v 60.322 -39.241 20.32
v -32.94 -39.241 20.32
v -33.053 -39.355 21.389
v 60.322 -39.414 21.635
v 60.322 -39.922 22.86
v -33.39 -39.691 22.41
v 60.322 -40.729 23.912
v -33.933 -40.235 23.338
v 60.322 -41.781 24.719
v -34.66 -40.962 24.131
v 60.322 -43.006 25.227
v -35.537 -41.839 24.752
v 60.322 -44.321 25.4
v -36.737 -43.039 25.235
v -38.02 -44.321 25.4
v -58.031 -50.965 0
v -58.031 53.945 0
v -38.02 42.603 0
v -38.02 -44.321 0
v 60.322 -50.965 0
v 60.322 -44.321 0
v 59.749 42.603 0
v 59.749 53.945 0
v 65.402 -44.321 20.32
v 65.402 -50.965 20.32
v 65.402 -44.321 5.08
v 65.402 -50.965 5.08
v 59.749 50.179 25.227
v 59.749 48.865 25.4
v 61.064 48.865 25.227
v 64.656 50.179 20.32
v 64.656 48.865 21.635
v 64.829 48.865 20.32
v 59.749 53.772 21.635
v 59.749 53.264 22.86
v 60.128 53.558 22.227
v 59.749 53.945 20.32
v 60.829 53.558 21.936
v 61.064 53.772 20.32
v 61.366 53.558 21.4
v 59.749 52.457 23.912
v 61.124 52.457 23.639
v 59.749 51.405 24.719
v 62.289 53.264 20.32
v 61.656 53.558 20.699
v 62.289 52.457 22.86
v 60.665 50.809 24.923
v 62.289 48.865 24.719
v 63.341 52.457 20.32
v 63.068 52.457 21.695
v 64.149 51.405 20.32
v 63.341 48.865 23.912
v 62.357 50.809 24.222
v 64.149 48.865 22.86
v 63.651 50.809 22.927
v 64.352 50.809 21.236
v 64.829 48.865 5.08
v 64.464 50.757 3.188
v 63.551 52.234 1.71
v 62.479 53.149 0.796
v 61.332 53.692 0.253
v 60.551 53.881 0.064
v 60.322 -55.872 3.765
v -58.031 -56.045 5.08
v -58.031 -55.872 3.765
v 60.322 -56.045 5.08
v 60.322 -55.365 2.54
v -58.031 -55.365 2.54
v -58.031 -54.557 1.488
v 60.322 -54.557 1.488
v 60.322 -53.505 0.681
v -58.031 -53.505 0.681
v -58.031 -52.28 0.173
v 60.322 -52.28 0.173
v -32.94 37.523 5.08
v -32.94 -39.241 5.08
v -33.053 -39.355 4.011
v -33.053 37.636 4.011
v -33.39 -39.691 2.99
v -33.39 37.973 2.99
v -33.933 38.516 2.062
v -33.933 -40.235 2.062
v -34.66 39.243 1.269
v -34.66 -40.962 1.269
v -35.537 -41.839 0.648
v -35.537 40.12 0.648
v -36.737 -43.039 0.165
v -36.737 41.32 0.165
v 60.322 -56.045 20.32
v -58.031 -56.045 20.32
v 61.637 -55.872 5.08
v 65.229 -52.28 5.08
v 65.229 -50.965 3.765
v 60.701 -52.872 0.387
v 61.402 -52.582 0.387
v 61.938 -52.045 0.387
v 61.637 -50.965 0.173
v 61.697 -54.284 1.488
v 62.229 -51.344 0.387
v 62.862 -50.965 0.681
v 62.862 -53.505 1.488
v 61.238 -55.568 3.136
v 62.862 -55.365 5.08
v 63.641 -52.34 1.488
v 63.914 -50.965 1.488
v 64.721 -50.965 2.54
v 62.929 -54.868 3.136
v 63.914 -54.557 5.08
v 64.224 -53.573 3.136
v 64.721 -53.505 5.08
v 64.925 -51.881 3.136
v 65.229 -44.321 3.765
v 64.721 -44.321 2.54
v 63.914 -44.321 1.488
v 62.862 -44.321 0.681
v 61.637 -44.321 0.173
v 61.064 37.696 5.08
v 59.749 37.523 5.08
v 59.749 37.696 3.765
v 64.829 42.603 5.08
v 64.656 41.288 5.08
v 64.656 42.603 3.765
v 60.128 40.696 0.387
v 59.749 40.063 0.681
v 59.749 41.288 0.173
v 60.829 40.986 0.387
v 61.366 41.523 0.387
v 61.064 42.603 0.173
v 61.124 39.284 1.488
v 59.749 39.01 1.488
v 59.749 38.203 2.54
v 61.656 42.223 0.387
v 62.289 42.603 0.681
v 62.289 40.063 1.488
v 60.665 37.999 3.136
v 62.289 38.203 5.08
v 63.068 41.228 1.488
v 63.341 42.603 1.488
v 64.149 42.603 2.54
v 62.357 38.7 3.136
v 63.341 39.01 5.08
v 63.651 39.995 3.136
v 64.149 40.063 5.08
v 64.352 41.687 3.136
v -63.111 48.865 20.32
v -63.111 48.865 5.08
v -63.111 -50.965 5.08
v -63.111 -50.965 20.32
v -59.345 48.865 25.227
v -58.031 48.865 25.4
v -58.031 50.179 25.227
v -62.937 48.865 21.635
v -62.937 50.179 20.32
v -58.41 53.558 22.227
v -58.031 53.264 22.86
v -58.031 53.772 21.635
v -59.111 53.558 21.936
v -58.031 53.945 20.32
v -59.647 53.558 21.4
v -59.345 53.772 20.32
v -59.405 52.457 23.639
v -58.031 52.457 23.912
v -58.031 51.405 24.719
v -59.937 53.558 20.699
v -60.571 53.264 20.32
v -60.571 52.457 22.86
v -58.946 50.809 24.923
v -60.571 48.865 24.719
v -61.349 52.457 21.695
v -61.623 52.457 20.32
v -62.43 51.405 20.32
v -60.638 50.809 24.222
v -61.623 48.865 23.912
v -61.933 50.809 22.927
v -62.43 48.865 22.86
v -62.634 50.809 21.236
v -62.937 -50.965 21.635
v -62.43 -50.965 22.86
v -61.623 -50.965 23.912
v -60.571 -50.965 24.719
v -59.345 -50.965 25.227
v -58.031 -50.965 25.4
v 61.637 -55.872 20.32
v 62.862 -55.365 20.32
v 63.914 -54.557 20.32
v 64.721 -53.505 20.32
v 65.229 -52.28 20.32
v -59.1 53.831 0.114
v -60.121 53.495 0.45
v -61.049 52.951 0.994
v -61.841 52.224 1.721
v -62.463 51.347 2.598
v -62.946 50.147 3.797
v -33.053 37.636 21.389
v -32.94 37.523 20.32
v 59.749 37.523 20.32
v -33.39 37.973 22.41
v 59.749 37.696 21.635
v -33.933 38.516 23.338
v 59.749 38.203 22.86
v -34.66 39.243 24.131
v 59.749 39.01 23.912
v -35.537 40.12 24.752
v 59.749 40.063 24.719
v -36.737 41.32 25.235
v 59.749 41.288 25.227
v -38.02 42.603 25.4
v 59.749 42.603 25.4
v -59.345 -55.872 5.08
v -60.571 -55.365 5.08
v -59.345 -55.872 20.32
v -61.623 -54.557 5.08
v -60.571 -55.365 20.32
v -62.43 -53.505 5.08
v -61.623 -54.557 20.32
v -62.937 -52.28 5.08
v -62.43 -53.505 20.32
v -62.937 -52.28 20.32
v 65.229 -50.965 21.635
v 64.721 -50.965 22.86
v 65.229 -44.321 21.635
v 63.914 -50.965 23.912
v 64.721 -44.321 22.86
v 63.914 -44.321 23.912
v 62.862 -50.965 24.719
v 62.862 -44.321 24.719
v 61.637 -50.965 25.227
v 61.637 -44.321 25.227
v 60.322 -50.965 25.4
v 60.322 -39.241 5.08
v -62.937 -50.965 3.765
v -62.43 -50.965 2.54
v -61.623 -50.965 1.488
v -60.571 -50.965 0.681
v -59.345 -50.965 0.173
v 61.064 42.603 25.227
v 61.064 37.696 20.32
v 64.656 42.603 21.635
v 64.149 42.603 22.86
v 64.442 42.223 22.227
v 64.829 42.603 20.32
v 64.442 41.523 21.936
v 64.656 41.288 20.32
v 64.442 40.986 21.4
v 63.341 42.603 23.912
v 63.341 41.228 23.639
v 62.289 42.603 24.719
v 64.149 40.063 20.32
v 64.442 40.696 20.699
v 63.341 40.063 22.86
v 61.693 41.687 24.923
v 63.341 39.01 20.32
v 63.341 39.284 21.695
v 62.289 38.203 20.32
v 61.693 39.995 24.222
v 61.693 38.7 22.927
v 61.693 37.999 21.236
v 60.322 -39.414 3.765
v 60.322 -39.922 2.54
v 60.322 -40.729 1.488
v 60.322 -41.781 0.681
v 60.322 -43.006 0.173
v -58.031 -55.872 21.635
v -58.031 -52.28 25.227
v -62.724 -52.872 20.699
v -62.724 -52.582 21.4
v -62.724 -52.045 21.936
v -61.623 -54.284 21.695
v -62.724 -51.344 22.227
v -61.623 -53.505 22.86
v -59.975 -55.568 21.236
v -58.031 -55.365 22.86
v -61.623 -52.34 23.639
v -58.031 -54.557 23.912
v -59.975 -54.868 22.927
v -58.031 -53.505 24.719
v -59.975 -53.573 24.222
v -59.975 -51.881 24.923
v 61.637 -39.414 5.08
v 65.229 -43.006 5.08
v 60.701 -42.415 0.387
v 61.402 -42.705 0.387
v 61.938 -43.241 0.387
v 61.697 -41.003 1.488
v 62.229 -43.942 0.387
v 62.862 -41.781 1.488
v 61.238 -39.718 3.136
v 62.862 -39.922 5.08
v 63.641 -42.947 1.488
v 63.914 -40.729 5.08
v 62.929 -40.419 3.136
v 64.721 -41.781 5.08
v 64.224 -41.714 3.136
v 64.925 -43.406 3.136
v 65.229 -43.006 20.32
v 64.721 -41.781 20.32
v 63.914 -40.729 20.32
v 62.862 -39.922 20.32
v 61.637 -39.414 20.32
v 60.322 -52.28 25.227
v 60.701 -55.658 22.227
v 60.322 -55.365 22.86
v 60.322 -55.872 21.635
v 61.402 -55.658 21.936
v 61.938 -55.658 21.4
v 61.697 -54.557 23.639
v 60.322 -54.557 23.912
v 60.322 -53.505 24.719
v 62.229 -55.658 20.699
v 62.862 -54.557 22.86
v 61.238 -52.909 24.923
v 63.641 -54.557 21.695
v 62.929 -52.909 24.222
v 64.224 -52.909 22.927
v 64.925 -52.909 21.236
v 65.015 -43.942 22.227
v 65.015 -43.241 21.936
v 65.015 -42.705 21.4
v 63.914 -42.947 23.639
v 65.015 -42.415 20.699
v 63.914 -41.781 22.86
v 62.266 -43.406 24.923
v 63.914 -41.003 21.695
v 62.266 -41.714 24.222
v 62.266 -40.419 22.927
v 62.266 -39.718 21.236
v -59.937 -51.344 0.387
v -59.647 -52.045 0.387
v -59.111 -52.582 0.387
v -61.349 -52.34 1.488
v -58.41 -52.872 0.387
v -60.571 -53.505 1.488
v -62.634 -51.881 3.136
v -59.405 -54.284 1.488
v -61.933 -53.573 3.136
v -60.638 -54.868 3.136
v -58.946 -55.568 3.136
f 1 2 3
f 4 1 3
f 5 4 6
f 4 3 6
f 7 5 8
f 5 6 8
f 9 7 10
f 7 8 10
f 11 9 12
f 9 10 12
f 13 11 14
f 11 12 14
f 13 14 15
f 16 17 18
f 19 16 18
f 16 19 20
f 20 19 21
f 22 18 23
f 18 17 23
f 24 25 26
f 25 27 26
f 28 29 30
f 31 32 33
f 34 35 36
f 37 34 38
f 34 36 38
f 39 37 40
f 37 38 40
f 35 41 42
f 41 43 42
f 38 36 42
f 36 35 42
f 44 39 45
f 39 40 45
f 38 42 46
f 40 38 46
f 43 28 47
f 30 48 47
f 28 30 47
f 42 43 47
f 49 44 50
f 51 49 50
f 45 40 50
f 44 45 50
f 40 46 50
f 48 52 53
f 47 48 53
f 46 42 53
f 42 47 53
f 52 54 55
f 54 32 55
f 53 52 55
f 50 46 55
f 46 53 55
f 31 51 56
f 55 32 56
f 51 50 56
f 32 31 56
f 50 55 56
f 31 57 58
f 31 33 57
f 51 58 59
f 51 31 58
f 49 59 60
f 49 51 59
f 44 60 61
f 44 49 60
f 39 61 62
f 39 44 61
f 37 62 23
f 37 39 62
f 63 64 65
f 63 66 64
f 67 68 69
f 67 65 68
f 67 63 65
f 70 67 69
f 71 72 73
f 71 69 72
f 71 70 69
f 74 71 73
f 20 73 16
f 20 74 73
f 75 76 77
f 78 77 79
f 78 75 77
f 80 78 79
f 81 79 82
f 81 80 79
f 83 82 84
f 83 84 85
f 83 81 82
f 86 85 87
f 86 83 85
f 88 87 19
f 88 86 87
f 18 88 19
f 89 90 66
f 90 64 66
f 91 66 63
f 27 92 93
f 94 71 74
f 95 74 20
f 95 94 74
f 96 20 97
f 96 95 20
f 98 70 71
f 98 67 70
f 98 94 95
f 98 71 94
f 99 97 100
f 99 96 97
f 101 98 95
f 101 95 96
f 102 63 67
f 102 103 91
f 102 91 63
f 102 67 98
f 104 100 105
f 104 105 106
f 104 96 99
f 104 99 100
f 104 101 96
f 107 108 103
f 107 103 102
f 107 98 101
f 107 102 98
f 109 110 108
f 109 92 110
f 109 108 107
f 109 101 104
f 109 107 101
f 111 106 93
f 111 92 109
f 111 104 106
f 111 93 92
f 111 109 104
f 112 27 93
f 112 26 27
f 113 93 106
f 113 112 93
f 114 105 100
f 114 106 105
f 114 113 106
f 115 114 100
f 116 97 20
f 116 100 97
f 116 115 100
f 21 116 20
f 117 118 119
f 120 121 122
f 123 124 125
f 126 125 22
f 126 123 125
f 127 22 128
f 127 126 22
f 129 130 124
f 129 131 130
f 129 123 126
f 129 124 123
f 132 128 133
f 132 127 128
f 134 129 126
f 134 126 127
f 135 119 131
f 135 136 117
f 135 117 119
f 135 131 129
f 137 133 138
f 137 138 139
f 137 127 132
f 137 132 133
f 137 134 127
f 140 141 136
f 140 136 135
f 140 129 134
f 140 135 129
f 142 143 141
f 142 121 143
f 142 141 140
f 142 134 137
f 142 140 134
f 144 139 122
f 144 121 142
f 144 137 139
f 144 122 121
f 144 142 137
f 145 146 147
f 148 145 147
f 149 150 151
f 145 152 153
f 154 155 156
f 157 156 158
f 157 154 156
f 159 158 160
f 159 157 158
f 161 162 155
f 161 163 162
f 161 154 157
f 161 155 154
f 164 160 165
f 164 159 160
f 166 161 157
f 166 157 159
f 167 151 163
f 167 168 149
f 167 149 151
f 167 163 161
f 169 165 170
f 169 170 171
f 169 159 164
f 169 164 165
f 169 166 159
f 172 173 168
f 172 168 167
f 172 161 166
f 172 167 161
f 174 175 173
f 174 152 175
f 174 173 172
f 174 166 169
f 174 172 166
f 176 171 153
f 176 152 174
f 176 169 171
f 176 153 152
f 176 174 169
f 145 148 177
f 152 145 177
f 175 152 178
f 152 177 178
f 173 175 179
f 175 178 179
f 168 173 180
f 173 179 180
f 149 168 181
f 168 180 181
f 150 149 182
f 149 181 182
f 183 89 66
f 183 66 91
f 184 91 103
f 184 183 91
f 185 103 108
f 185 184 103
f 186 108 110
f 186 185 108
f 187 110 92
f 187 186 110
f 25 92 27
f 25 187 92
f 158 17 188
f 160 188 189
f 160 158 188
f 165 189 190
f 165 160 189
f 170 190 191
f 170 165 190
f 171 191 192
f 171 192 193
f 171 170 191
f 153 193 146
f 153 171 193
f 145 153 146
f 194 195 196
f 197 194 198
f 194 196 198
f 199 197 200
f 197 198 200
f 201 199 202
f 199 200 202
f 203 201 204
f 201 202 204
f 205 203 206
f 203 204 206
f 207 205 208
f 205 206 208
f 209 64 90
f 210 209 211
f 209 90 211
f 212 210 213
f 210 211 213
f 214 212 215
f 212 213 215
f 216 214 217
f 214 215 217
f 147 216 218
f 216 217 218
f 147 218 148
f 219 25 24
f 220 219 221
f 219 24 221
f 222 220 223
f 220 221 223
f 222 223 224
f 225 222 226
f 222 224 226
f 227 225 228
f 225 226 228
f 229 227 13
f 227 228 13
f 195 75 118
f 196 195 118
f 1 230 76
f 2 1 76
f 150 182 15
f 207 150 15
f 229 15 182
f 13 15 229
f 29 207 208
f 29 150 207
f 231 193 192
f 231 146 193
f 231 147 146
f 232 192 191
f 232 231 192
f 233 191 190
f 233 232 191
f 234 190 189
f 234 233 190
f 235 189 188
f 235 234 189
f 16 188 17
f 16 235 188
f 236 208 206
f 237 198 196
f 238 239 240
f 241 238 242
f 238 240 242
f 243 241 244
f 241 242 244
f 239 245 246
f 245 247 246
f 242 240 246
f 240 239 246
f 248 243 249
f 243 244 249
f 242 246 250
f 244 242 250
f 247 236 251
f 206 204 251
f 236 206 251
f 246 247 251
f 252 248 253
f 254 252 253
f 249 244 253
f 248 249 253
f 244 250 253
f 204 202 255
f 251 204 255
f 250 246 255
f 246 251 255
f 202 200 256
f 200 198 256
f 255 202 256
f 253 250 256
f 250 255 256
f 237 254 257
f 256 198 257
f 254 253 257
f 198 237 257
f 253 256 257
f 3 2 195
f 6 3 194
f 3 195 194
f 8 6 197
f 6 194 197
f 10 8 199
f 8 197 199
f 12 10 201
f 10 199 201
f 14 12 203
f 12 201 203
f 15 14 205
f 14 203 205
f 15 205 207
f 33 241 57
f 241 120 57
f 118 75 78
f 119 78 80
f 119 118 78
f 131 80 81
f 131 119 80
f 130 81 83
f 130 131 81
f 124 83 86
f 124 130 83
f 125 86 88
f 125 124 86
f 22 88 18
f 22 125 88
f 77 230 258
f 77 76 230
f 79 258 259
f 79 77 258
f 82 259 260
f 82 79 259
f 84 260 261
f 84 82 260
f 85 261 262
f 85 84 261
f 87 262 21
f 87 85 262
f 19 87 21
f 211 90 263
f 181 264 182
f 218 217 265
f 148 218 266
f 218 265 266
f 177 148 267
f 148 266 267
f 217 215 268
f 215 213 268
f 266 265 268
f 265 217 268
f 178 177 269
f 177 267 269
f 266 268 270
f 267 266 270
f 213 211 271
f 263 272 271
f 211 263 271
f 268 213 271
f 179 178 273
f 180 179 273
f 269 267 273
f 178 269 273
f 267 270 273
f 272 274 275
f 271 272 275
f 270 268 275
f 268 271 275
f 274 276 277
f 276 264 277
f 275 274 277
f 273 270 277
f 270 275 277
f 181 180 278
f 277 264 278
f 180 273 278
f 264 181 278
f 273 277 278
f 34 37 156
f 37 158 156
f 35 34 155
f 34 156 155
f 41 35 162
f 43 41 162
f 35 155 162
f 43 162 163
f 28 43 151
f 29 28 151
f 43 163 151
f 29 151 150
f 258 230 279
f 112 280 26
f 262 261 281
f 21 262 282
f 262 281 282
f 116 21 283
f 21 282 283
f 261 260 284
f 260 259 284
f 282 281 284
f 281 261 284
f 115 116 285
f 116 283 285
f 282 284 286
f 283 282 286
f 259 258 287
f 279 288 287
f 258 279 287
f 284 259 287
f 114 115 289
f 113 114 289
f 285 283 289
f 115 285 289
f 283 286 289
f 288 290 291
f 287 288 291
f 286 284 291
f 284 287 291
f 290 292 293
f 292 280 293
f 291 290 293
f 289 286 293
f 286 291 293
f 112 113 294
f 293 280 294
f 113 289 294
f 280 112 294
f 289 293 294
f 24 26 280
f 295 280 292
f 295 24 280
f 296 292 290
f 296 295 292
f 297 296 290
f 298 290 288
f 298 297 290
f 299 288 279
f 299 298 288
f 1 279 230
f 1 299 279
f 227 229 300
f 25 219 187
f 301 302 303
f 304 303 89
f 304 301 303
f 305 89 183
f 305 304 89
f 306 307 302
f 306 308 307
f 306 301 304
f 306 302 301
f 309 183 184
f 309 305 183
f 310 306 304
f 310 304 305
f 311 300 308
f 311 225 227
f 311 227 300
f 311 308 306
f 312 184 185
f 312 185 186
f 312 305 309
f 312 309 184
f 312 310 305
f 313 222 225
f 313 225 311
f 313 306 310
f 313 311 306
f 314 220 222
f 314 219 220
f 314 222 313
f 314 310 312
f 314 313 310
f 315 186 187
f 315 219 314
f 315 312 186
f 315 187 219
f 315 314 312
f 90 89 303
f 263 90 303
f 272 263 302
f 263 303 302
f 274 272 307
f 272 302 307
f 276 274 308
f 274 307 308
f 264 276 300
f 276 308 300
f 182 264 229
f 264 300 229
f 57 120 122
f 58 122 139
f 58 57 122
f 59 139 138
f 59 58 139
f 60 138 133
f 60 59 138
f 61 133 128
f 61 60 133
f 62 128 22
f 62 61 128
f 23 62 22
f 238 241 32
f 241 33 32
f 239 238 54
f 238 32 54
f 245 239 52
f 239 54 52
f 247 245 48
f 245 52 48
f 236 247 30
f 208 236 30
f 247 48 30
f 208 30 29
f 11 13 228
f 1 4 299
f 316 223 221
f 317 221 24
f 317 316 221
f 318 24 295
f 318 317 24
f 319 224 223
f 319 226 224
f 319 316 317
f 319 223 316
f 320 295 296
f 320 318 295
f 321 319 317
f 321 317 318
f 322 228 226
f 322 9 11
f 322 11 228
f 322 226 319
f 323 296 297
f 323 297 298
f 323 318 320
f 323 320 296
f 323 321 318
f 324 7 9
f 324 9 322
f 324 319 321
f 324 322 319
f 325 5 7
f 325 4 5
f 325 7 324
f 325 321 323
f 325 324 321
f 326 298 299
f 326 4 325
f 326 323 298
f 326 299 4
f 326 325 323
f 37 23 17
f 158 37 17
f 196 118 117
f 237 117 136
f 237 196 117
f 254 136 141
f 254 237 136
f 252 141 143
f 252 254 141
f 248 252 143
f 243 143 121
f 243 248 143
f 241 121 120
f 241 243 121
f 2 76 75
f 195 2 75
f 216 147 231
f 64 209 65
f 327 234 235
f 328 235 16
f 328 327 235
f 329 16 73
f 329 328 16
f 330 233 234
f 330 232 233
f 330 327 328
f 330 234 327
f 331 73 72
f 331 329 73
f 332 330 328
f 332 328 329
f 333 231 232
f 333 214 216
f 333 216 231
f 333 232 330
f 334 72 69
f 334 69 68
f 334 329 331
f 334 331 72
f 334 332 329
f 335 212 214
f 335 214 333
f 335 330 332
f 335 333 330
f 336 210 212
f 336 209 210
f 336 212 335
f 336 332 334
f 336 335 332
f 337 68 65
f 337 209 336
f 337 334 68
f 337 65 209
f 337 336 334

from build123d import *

# Parameters (mm, degrees)
F0_W     = 30.1708392799
F0_H     = 76.7637714744
F1_DEPTH = 25.4
F2_R     = 5.08


with BuildPart() as f1:
    # F0 (on Top) → F1 (new body)
    with BuildSketch(Plane.XY):
        with Locations((-48.0250958353, -0.8592940867)):
            Rectangle(F0_W, F0_H)
        Polygon((-32.9396761954, -39.2411798239), (-63.1105154753, -39.2411798239), (-63.1105154753, -56.0451894999), (65.4019713402, -56.0451894999), (65.4019713402, -39.2411798239), align=None)
        Polygon((64.8291036487, 53.9446882904), (-63.1105154753, 53.9446882904), (-63.1105154753, 37.5225916505), (-32.9396761954, 37.5225916505), (64.8291036487, 37.5225916505), align=None)
    extrude(amount=F1_DEPTH)

    # F2
    f2_edges = [f1.edges().sort_by_distance(p)[0] for p in [
        (15.944714, 37.522592, 25.4),
        (-32.939676, -0.859294, 25.4),
        (16.231148, -39.24118, 25.4),
        (65.401971, -47.643185, 25.4),
        (64.829104, 45.73364, 25.4),
        (1.145728, -56.045189, 25.4),
        (65.401971, -56.045189, 12.7),
        (65.401971, -39.24118, 12.7),
        (-63.110515, -56.045189, 12.7),
        (-63.110515, -1.050251, 25.4),
        (0.859294, 53.944688, 25.4),
        (64.829104, 37.522592, 12.7),
        (64.829104, 53.944688, 12.7),
        (-63.110515, 53.944688, 12.7),
        (-63.110515, -1.050251, 0),
        (1.145728, -56.045189, 0),
        (15.944714, 37.522592, 0),
        (-32.939676, -0.859294, 0),
        (16.231148, -39.24118, 0),
        (65.401971, -47.643185, 0),
        (64.829104, 45.73364, 0),
    ]]
    fillet(f2_edges, radius=F2_R)


solid = f1.part
